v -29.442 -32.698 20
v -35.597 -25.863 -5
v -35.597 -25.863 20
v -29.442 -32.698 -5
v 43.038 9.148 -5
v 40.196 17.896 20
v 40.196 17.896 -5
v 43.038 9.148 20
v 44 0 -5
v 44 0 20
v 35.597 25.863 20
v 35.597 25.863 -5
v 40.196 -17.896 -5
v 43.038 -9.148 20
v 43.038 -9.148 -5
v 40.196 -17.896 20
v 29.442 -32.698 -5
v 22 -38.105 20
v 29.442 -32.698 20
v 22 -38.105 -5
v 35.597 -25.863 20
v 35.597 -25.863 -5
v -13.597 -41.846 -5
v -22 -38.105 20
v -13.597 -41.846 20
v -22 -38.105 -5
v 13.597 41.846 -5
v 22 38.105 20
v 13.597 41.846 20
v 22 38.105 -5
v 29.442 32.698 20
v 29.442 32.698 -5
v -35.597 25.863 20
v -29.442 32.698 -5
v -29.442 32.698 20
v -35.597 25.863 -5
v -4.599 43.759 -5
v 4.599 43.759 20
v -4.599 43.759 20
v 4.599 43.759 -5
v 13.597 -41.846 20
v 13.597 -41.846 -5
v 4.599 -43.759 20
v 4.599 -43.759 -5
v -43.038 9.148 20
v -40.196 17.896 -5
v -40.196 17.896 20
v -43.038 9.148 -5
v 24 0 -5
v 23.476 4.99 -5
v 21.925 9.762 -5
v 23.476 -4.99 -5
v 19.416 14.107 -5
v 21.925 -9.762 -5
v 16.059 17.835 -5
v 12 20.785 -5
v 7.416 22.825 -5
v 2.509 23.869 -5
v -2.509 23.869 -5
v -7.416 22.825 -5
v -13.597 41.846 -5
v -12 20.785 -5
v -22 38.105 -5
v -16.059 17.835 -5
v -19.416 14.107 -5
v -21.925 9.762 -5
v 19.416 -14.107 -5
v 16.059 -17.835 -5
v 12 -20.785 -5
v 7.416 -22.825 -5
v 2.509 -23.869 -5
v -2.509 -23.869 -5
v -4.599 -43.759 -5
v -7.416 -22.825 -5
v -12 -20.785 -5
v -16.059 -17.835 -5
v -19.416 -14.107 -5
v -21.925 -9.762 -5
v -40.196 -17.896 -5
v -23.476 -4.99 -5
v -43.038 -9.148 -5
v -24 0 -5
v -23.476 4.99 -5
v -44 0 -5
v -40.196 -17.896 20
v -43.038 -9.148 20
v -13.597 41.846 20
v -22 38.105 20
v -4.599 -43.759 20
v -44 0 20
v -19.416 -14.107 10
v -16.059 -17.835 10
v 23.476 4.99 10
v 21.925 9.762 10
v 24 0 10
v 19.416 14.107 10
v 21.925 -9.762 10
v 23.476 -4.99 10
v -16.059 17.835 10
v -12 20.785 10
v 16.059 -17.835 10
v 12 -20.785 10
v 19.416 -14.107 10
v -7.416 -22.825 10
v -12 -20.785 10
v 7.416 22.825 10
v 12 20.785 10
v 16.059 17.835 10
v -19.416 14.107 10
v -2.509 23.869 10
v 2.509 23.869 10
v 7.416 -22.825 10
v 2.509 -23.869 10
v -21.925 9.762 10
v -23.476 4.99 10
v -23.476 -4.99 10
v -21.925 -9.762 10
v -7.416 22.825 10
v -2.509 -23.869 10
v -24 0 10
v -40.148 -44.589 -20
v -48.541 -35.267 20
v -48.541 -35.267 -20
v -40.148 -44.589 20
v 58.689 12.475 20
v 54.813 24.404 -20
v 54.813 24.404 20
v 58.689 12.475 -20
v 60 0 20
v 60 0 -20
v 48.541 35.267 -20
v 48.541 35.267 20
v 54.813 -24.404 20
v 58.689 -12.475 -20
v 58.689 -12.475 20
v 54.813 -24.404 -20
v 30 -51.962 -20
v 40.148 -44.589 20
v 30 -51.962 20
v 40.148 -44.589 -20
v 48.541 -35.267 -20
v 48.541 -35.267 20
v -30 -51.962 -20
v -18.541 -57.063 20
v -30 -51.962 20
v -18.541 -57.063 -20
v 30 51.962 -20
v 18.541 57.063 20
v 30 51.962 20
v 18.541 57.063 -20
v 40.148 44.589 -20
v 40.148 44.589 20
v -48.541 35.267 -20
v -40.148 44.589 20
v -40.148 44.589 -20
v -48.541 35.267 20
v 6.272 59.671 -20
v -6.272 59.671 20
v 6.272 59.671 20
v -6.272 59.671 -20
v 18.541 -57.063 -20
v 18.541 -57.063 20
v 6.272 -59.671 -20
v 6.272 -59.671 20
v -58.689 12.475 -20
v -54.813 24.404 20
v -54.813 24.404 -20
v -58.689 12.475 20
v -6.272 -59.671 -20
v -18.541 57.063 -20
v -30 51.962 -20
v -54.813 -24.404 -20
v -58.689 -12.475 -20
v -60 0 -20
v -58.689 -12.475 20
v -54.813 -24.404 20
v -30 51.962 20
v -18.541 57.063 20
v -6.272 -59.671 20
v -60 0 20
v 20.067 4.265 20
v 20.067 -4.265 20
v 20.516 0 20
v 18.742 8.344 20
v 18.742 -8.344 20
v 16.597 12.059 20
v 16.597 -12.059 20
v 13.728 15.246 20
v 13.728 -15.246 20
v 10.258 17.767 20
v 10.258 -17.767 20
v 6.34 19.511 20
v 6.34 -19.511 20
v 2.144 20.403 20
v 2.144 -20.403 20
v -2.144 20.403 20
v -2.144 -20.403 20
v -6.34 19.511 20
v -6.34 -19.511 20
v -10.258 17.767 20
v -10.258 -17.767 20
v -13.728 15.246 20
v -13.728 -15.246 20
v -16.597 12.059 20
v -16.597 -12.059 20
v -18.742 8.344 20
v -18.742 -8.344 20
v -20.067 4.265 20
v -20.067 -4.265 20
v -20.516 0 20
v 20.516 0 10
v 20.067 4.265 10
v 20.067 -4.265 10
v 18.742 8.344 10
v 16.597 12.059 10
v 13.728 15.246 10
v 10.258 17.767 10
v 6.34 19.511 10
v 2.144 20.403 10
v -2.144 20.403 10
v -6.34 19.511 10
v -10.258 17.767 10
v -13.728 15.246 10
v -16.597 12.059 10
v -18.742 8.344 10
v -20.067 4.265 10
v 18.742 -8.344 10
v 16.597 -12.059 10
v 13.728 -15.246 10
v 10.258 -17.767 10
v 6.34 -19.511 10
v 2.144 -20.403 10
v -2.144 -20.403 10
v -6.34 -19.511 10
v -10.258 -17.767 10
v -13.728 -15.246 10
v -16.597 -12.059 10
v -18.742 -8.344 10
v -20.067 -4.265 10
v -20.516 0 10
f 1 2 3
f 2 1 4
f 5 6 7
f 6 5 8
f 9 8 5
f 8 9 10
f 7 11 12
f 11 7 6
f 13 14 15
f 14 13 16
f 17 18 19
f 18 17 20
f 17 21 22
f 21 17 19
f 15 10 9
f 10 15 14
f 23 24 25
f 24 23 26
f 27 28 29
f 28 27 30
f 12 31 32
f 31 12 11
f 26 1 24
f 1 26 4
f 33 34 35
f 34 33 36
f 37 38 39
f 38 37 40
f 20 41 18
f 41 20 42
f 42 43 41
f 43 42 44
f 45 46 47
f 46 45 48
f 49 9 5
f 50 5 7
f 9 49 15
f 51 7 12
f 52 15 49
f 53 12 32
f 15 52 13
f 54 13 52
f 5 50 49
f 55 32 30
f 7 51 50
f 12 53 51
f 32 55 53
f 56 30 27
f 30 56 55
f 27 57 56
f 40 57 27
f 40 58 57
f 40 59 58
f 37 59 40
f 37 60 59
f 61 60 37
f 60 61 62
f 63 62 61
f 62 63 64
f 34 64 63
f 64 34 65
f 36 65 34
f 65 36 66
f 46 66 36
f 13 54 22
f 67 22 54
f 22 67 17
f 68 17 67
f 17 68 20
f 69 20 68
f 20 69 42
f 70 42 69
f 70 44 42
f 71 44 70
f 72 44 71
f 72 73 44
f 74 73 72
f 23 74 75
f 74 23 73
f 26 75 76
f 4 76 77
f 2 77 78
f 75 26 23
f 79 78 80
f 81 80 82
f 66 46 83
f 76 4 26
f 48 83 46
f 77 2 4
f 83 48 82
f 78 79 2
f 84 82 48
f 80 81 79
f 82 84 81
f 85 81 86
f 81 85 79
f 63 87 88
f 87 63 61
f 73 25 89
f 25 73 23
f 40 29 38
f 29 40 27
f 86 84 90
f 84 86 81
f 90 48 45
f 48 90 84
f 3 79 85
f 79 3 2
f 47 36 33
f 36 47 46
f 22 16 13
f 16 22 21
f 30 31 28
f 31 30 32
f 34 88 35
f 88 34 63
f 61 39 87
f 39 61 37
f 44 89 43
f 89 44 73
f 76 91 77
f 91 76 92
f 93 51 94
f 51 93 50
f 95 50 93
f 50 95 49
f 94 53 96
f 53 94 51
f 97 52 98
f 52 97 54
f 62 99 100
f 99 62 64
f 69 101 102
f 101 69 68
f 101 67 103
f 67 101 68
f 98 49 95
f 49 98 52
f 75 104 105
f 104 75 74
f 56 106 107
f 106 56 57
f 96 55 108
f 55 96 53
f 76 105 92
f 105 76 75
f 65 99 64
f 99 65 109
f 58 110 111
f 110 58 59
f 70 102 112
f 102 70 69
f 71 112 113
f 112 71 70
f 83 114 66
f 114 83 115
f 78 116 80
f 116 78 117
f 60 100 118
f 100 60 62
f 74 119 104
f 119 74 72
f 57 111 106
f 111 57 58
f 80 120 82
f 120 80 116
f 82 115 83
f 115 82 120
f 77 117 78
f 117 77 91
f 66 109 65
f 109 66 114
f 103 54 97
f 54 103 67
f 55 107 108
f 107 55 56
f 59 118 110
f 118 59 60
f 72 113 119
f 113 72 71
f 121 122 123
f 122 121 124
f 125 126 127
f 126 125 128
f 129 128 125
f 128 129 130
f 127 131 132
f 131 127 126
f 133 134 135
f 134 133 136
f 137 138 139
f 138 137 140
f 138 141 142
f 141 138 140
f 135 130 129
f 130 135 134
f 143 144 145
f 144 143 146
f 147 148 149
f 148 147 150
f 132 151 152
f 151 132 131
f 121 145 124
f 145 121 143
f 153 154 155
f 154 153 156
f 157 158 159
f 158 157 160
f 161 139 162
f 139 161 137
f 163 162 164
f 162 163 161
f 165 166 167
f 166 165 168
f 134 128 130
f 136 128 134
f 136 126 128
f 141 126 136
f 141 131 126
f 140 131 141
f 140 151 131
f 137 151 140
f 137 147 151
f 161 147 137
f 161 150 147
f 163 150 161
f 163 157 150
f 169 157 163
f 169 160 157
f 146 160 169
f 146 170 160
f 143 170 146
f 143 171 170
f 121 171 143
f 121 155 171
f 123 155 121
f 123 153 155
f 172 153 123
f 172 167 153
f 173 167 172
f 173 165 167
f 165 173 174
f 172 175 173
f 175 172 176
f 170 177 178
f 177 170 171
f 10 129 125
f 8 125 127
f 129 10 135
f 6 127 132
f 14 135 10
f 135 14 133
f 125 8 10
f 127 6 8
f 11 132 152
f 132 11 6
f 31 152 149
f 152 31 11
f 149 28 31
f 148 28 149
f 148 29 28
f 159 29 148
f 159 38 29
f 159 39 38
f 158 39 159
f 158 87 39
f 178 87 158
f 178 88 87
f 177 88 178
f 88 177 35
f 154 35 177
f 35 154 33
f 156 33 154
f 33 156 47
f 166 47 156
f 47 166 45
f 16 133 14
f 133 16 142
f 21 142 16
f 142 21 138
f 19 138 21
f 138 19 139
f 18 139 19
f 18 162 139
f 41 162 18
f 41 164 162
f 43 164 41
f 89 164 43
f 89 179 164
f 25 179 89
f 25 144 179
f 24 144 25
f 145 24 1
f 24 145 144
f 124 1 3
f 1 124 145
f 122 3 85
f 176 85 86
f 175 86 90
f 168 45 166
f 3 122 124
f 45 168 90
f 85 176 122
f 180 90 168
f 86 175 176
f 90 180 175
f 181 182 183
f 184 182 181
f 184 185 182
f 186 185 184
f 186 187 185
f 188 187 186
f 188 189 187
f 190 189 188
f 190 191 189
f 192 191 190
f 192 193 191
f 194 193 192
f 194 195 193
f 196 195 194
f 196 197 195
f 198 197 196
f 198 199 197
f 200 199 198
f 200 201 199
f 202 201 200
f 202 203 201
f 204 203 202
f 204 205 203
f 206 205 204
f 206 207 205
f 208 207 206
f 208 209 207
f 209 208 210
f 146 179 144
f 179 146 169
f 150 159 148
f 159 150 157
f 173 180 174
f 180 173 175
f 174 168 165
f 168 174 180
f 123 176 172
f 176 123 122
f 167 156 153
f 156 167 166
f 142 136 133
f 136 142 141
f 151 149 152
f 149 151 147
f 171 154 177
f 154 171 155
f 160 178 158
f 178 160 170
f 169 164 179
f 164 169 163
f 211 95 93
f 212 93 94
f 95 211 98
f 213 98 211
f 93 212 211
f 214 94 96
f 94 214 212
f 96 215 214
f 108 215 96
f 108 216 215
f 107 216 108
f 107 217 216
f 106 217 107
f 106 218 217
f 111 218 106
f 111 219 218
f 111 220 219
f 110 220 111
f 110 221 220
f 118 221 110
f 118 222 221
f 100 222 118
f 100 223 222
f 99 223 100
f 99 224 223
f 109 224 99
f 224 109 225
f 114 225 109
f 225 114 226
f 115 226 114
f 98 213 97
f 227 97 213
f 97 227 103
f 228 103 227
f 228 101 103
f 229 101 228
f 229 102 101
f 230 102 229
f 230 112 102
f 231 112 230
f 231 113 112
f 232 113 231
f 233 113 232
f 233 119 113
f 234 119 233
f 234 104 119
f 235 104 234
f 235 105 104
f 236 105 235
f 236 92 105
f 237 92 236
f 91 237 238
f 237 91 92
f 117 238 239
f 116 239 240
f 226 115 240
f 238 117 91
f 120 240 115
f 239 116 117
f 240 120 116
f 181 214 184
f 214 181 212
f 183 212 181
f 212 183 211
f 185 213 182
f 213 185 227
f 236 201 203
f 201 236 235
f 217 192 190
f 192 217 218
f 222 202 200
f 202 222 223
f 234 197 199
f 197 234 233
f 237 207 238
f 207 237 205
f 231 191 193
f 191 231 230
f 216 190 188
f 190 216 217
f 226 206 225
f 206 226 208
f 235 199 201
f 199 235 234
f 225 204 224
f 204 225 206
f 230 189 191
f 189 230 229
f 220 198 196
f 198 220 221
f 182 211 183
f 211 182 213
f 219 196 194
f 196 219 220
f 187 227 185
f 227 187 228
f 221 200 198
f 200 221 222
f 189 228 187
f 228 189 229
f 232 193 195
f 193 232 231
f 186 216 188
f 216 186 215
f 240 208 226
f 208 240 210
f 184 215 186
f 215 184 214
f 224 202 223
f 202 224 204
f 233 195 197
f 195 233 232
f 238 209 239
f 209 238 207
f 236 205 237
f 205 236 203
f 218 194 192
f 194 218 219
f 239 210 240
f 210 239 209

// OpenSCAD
 
difference()
  {
  difference()
    {
        cylinder(h=40, r1=60, r2=60,center=true);
        translate([0,0,20]) {
        difference()
            {
            cylinder(50,r1=44,r2=44,center=true);
            cylinder(60,r1=24,r2=24,center=true);   
            }
        }
}
   translate([0,0,35]) {
  difference()
 {
    cylinder(50,r1=44,r2=44,center=true);
    cylinder(60,r1=20.51558,r2=20.51558,center=true);   
 }
}
}




 
 
 
